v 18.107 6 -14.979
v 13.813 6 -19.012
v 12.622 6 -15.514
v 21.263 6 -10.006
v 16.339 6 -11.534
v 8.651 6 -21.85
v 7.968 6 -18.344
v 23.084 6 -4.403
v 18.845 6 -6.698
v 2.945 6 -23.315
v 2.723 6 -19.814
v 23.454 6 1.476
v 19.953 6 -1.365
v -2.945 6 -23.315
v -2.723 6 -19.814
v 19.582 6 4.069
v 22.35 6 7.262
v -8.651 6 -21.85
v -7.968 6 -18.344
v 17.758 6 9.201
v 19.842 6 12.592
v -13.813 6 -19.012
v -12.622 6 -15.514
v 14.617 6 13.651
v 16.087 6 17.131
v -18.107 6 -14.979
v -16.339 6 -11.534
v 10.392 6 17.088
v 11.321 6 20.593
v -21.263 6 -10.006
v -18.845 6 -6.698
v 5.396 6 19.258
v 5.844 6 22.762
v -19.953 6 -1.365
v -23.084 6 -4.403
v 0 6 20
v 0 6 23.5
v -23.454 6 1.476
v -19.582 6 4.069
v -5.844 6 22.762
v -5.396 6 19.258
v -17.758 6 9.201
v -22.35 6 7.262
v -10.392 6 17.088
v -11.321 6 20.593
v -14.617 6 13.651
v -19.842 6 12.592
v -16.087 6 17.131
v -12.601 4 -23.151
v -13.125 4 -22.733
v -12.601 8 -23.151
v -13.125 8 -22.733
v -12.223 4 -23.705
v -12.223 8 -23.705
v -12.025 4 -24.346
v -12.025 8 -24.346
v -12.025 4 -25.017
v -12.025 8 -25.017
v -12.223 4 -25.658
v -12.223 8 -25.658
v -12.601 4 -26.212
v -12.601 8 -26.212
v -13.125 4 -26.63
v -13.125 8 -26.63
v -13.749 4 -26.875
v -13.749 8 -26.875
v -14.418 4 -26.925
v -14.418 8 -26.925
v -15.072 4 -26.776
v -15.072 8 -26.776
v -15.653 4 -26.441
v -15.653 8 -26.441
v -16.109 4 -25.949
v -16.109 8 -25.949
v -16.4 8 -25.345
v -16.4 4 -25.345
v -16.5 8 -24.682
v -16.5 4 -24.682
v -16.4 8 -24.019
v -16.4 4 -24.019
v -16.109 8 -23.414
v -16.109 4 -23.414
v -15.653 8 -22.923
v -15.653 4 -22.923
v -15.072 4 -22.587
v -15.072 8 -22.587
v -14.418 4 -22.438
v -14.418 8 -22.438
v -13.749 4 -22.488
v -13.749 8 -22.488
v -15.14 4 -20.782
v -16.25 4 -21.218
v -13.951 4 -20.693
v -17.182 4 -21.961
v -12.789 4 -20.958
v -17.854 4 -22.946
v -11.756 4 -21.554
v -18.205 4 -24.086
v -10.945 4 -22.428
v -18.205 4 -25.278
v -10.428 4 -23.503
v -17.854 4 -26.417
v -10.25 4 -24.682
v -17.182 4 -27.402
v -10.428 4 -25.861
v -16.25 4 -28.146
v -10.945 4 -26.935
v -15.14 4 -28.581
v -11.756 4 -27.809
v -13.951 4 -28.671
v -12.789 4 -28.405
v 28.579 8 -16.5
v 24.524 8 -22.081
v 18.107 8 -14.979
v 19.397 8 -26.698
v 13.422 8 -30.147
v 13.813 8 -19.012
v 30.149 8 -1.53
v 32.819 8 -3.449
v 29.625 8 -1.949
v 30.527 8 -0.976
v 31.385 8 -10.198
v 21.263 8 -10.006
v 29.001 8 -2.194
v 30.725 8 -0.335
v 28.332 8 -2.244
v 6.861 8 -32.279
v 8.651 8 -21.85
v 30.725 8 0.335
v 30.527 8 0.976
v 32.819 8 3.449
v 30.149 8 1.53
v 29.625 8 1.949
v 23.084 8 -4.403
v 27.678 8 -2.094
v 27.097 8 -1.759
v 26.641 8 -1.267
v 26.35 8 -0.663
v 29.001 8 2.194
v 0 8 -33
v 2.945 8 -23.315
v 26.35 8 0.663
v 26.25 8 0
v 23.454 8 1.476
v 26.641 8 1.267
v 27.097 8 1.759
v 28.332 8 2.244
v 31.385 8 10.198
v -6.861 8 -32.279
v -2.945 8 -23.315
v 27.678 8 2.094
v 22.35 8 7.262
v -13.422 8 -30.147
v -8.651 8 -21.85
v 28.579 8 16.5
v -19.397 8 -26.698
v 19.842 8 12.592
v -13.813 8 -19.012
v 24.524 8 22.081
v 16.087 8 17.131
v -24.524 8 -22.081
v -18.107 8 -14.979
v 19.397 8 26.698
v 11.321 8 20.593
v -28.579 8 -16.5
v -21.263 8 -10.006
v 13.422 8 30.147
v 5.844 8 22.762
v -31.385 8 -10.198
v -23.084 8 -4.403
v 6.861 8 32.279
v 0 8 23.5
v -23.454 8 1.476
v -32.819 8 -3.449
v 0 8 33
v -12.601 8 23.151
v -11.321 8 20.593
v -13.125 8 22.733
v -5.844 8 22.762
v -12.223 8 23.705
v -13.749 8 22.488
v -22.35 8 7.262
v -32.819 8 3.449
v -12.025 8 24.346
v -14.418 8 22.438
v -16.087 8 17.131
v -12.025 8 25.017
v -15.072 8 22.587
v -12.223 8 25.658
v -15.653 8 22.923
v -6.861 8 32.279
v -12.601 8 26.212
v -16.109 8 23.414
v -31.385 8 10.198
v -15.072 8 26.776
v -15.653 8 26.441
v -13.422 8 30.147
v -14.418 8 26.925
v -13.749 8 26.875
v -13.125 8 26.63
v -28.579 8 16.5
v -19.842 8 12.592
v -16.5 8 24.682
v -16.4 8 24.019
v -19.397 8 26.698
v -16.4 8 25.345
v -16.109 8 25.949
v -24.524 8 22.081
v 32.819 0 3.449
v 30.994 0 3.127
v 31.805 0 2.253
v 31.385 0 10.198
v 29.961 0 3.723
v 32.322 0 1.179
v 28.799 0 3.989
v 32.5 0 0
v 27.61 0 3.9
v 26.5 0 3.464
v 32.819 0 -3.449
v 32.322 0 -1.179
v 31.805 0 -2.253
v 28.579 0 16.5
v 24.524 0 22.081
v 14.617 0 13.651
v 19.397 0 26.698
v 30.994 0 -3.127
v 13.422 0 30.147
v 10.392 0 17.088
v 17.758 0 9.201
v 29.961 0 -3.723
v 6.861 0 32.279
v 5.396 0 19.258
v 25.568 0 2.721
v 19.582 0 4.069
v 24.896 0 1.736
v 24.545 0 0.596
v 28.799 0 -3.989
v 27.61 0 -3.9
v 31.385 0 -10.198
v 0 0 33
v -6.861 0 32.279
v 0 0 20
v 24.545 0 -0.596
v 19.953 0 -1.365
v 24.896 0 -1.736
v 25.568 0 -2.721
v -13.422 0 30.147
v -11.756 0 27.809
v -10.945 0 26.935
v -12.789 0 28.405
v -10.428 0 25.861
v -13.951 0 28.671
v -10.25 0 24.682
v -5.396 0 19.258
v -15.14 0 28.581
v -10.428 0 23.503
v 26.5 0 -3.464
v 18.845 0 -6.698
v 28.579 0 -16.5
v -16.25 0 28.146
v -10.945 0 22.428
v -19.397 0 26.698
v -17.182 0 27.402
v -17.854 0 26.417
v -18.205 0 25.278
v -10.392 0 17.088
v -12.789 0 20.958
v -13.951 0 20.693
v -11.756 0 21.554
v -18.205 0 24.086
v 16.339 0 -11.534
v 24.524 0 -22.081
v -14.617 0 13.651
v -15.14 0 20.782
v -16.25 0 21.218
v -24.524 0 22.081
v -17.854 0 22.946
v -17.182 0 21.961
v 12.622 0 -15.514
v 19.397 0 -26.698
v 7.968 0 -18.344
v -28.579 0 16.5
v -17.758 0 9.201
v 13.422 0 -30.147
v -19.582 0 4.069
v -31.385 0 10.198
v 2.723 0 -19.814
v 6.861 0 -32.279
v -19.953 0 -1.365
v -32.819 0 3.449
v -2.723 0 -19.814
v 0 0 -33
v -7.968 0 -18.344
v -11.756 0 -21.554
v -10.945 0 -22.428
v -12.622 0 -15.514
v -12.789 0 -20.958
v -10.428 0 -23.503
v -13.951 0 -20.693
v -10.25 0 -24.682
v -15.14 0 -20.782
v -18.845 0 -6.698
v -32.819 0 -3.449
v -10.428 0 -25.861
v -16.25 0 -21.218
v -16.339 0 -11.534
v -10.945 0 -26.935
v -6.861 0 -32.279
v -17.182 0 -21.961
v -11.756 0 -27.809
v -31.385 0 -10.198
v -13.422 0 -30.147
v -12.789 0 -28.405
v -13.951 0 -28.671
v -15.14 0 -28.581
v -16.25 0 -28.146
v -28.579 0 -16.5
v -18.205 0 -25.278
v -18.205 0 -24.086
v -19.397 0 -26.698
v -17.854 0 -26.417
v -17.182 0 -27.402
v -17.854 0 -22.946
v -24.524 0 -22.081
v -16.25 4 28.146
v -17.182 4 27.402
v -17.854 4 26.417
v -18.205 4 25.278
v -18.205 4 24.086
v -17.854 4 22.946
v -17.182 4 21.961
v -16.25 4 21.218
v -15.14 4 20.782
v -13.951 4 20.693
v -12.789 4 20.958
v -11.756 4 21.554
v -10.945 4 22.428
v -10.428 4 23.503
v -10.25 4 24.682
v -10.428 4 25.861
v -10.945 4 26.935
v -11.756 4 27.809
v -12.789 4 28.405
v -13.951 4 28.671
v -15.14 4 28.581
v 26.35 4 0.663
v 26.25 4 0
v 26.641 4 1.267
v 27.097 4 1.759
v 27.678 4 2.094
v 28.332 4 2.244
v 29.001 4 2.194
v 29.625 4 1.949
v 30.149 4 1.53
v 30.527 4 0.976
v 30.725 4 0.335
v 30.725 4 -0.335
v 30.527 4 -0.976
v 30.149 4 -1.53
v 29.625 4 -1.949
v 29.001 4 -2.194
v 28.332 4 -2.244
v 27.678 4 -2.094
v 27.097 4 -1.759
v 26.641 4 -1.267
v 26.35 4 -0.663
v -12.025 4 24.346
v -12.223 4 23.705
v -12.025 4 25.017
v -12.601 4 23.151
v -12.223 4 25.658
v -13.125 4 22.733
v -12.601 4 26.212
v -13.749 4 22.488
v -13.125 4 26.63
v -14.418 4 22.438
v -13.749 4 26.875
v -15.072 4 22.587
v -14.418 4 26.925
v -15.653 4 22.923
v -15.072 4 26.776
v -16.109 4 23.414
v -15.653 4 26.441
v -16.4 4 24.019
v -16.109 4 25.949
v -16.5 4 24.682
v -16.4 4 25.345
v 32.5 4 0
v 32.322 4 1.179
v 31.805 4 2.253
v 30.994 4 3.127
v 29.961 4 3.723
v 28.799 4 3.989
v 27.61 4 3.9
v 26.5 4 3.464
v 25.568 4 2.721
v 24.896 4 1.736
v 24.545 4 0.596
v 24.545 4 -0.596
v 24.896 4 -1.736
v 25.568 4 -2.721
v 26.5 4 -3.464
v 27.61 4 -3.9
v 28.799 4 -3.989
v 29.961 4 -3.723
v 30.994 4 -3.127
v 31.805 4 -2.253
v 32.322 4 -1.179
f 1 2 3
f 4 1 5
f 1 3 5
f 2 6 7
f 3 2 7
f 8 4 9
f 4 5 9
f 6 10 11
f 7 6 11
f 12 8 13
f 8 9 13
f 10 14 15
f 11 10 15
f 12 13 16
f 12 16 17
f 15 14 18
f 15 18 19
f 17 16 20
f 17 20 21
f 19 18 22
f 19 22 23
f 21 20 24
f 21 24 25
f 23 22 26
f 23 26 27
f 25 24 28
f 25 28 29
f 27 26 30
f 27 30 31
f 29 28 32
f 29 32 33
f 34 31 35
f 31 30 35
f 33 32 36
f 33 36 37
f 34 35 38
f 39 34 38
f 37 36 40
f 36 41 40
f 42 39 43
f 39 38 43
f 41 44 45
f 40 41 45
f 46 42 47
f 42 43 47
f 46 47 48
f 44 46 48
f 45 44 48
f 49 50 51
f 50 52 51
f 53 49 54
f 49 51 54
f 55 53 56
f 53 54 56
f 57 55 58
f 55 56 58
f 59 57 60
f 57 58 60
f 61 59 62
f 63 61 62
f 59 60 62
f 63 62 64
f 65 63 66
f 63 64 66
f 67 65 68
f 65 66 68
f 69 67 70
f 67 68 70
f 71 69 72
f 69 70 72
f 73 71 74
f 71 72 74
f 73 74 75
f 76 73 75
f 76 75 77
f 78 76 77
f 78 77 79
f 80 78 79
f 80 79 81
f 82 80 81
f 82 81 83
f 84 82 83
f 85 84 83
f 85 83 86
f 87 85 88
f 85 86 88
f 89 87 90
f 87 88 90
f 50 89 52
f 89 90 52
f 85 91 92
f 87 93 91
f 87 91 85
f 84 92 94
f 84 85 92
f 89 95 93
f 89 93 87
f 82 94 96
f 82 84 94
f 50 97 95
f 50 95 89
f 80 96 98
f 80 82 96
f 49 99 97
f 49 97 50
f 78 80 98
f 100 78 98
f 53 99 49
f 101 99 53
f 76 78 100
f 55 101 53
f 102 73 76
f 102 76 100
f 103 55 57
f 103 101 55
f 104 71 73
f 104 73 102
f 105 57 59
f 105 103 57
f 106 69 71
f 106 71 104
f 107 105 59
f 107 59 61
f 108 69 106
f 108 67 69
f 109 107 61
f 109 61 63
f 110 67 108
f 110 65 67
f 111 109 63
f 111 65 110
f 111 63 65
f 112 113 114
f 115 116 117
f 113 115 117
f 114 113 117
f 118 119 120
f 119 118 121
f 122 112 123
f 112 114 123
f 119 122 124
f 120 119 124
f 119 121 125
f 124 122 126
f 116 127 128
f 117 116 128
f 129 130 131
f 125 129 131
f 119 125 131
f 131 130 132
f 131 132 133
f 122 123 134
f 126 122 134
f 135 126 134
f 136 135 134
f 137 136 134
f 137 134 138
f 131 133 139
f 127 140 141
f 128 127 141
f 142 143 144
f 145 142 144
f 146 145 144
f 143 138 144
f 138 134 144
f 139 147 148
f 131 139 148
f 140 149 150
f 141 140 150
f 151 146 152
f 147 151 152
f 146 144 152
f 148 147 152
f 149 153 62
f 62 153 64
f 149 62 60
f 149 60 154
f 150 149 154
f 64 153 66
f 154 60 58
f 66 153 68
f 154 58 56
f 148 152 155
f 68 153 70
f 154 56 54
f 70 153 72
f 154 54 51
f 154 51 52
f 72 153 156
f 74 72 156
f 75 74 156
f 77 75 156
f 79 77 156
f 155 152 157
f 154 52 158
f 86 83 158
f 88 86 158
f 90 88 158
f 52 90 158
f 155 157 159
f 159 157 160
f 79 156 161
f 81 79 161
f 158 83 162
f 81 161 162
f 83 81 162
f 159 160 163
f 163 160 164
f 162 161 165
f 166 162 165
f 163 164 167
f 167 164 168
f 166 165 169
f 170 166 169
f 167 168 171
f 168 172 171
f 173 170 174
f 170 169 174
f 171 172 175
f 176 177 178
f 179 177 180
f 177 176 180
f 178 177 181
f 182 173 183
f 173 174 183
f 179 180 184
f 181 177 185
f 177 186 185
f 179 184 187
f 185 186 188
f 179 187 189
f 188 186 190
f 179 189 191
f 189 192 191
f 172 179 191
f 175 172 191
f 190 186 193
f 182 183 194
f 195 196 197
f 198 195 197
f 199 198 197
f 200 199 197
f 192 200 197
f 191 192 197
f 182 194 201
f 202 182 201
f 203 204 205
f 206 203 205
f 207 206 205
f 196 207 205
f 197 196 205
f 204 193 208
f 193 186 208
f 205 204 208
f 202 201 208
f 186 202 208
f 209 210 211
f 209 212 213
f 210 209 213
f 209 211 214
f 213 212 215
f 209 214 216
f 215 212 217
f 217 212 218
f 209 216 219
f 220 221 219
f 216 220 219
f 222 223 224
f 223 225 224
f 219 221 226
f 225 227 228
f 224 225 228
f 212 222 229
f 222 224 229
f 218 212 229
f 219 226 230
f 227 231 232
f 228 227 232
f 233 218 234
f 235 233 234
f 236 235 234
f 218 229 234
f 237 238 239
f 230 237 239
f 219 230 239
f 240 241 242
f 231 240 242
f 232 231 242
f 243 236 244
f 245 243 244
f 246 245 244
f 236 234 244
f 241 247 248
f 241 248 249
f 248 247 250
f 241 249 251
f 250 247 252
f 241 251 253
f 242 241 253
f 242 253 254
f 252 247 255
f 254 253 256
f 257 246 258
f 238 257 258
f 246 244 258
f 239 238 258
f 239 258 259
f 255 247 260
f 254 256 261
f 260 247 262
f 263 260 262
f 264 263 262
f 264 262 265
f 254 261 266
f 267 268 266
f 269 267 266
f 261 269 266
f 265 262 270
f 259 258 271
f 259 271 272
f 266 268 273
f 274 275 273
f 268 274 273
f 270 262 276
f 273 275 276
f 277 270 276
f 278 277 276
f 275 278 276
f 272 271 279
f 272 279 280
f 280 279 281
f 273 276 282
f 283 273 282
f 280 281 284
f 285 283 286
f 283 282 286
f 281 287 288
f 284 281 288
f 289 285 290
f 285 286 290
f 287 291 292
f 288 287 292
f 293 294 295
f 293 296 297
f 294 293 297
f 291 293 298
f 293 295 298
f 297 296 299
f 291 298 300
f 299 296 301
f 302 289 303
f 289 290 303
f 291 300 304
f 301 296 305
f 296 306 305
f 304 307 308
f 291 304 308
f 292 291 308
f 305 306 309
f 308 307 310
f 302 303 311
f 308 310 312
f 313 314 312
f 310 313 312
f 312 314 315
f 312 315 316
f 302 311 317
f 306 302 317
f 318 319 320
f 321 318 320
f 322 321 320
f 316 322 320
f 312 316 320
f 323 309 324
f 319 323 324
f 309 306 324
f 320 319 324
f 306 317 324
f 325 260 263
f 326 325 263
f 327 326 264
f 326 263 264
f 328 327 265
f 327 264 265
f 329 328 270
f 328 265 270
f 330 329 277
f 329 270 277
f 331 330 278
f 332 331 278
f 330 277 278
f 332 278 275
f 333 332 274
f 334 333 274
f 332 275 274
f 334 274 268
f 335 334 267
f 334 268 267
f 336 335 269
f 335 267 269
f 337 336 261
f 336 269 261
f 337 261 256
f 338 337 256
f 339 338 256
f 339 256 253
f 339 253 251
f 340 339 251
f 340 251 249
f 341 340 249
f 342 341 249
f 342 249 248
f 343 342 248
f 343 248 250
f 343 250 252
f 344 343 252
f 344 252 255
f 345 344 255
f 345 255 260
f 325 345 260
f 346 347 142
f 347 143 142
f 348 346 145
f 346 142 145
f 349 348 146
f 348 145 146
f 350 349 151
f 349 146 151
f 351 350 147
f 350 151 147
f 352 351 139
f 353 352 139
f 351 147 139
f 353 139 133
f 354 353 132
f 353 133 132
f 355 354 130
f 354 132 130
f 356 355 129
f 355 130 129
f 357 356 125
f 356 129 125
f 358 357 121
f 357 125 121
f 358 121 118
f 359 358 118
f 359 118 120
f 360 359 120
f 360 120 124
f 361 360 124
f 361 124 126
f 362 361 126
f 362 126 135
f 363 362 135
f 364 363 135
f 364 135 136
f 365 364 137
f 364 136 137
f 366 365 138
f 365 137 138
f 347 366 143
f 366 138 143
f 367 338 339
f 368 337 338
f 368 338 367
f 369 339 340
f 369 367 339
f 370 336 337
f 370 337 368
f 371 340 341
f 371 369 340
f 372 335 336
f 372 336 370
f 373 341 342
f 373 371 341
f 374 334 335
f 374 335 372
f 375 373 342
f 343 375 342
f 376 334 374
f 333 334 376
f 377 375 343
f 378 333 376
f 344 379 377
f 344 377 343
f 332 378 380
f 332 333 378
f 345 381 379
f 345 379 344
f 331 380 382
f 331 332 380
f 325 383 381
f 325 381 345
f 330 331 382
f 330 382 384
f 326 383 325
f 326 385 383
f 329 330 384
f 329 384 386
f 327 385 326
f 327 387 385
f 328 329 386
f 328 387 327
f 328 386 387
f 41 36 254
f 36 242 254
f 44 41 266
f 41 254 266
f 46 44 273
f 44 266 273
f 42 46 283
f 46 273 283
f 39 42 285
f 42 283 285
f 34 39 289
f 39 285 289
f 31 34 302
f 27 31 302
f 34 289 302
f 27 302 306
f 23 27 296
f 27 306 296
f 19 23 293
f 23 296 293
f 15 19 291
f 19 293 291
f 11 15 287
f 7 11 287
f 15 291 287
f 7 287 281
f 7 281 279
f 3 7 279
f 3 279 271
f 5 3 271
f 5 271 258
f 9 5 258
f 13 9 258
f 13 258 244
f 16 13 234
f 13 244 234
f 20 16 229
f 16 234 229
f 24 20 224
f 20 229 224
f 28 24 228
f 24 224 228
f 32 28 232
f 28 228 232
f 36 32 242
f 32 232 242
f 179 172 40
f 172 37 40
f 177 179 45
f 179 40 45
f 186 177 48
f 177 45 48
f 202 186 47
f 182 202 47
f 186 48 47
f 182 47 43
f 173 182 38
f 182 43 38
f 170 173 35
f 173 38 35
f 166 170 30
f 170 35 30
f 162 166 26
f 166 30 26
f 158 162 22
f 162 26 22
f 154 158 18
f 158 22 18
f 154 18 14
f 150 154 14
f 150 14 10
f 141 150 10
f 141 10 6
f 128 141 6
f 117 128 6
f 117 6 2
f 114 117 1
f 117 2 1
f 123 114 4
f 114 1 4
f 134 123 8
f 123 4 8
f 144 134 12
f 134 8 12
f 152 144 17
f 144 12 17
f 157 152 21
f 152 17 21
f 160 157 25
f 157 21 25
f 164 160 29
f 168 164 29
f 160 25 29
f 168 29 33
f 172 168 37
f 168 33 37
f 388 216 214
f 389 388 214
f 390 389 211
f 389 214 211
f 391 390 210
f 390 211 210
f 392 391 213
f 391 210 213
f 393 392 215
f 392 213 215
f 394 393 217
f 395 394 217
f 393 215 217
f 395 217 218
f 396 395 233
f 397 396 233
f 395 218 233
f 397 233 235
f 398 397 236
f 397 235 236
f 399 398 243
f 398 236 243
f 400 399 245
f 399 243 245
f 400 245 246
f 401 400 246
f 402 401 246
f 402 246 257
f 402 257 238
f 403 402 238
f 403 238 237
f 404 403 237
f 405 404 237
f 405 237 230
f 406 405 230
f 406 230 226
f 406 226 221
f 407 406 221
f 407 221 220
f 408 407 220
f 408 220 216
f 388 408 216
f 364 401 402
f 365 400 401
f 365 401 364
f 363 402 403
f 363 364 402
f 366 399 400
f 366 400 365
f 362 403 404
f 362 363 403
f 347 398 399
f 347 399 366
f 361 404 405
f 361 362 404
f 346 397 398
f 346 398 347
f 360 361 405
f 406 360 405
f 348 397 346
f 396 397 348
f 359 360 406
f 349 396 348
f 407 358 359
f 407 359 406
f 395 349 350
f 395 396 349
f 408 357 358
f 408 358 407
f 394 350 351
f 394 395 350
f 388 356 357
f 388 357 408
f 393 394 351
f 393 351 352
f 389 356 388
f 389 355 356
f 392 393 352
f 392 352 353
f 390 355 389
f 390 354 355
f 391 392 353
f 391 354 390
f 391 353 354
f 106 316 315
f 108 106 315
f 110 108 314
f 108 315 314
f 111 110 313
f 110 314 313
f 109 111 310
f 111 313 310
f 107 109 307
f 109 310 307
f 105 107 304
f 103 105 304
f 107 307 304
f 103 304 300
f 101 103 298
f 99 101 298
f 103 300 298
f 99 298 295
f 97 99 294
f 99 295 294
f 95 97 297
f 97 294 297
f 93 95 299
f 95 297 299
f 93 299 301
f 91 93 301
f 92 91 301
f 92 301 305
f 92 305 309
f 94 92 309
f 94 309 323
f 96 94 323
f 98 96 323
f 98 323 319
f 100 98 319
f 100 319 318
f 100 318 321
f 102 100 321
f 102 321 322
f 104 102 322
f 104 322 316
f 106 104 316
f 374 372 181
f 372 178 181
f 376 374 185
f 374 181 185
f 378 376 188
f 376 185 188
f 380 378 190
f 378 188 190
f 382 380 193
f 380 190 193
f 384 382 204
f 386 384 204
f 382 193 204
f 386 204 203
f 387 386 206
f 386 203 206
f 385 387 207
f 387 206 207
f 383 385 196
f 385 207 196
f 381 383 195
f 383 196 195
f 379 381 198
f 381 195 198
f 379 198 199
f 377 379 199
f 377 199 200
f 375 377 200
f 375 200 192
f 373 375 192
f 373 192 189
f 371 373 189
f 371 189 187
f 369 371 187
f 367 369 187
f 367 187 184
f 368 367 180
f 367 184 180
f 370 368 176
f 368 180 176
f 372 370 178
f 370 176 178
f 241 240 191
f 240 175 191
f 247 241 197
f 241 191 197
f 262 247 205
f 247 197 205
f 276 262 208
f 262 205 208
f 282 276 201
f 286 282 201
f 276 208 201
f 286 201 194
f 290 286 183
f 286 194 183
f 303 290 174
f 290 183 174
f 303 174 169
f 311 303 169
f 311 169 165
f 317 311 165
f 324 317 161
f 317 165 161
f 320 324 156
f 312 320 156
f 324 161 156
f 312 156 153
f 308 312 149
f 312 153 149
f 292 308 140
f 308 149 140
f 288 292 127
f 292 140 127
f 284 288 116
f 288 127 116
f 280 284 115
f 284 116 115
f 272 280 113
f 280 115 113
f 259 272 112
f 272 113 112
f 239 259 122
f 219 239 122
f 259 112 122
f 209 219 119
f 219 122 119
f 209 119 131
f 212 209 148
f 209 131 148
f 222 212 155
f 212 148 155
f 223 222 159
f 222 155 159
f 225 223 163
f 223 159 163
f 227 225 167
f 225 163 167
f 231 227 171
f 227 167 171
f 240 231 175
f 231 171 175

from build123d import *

# Parameters (mm, degrees)
CHAMBRAGE_POUR_VIS_T_TE_CYLINDRIQUE_D           = 4.5
CHAMBRAGE_POUR_VIS_T_TE_CYLINDRIQUE_CBORE_D     = 8
CHAMBRAGE_POUR_VIS_T_TE_CYLINDRIQUE_CBORE_DEPTH = 4
R_P_TITION_CIRCULAIRE1_COUNT                    = 3


with BuildPart() as part:
    # Esquisse1 → Révolution1 (revolve)
    with BuildSketch(Plane.XY, mode=Mode.PRIVATE) as r_volution1_sk:
        Polygon((20, 6), (20, 0), (33, 0), (33, 8), (23.5, 8), (23.5, 6), align=None)
    revolve(r_volution1_sk.sketch.rotate(Axis((0, 31.17754591, 0), (0, -1, 0)), 90), axis=Axis((0, 31.17754591, 0), (0, -1, 0)))

    # Chambrage pour vis à tête cylindrique à 6 pans creux (ou vis CHC) M41 (through all)
    with Locations(Plane.XZ):
        with Locations((28.5, 0)):
            chambrage_pour_vis_t_te_cylindrique = CounterBoreHole(CHAMBRAGE_POUR_VIS_T_TE_CYLINDRIQUE_D / 2, CHAMBRAGE_POUR_VIS_T_TE_CYLINDRIQUE_CBORE_D / 2, CHAMBRAGE_POUR_VIS_T_TE_CYLINDRIQUE_CBORE_DEPTH)

    # Répétition circulaire1: Chambrage pour vis à tête cylindrique à 6 pans creux (ou vis CHC) M41 ×3 about axis
    r_p_tition_circulaire1_axis = Axis((0, 0, 0), (0, 1, 0))
    for i in range(1, R_P_TITION_CIRCULAIRE1_COUNT):
        add(chambrage_pour_vis_t_te_cylindrique.rotate(r_p_tition_circulaire1_axis, i * 360 / R_P_TITION_CIRCULAIRE1_COUNT), mode=Mode.SUBTRACT)


solid = part.part
